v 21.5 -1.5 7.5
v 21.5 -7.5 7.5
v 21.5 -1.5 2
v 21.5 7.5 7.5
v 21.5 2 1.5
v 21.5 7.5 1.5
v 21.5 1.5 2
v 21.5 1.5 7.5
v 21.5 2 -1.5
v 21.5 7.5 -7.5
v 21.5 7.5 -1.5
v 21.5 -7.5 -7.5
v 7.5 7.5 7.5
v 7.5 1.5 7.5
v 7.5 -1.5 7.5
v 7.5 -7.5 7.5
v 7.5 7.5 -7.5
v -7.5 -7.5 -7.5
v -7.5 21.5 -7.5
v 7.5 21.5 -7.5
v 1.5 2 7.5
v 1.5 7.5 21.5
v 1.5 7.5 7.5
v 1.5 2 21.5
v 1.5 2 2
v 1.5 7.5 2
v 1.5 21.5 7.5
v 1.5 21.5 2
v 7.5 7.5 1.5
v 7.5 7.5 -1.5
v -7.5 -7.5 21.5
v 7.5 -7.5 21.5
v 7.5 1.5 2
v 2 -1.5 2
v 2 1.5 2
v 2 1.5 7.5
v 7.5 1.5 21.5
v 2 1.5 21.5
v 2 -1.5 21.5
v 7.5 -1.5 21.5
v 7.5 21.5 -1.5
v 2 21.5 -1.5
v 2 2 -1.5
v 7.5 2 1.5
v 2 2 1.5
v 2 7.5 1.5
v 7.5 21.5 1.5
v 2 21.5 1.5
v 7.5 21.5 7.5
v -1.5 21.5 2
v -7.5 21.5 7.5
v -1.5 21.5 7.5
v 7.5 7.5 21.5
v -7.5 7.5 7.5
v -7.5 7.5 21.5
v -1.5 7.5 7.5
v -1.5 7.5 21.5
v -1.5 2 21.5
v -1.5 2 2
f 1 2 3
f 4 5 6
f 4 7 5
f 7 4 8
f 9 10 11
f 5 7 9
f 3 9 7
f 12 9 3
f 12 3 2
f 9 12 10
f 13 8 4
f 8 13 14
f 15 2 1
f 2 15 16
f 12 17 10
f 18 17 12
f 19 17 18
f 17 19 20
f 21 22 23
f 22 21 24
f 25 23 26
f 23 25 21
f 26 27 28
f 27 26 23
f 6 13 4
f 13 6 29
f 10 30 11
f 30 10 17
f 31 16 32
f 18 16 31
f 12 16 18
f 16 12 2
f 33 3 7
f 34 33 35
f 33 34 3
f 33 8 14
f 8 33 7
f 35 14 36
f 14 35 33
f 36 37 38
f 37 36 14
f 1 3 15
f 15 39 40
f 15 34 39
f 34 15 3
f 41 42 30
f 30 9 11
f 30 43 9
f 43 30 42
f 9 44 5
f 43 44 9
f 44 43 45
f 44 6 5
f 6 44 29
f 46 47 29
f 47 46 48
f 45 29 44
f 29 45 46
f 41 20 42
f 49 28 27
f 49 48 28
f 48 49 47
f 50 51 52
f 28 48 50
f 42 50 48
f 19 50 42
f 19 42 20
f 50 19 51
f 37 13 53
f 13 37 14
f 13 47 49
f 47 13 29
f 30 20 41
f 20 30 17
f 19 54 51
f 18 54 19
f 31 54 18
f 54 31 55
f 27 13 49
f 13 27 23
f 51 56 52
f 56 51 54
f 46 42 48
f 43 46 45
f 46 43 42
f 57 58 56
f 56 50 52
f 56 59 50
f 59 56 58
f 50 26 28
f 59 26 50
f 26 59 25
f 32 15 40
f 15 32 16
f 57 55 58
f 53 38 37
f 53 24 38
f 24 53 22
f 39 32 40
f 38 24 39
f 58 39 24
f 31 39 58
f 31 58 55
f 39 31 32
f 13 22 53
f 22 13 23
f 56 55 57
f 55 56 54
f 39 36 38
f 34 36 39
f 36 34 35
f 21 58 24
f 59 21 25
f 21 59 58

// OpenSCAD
$fn = 20;
union()
{
  translate(v = [11.5, 0, 0])
  {
    difference()
    {
      difference()
      {
        cube(size = [20, 15, 15], center = true);
        translate(v = [0, 0, 5.5])
        {
          cube(size = [21, 3, 7], center = true);
        }
      }
      rotate(a = [-90, 0, 0], v = undef)
      {
        translate(v = [0, 0, 5.5])
        {
          cube(size = [21, 3, 7], center = true);
        }
      }
    }
  }
  translate(v = [0, 11.5, 0])
  {
    rotate(a = [90, 0, 90], v = undef)
    {
      difference()
      {
        difference()
        {
          cube(size = [20, 15, 15], center = true);
          translate(v = [0, 0, 5.5])
          {
            cube(size = [21, 3, 7], center = true);
          }
        }
        rotate(a = [-90, 0, 0], v = undef)
        {
          translate(v = [0, 0, 5.5])
          {
            cube(size = [21, 3, 7], center = true);
          }
        }
      }
    }
  }
  translate(v = [-2.95, -2.95, 0])
  {
    cube(size = [9.1, 9.1, 15], center = true);
  }
  translate(v = [0, 0, 11.5])
  {
    rotate(a = [0, 90, 0], v = undef)
    {
      difference()
      {
        difference()
        {
          cube(size = [20, 15, 15], center = true);
          translate(v = [0, 0, 5.5])
          {
            cube(size = [21, 3, 7], center = true);
          }
        }
        rotate(a = [-90, 0, 0], v = undef)
        {
          translate(v = [0, 0, 5.5])
          {
            cube(size = [21, 3, 7], center = true);
          }
        }
      }
    }
  }
}
